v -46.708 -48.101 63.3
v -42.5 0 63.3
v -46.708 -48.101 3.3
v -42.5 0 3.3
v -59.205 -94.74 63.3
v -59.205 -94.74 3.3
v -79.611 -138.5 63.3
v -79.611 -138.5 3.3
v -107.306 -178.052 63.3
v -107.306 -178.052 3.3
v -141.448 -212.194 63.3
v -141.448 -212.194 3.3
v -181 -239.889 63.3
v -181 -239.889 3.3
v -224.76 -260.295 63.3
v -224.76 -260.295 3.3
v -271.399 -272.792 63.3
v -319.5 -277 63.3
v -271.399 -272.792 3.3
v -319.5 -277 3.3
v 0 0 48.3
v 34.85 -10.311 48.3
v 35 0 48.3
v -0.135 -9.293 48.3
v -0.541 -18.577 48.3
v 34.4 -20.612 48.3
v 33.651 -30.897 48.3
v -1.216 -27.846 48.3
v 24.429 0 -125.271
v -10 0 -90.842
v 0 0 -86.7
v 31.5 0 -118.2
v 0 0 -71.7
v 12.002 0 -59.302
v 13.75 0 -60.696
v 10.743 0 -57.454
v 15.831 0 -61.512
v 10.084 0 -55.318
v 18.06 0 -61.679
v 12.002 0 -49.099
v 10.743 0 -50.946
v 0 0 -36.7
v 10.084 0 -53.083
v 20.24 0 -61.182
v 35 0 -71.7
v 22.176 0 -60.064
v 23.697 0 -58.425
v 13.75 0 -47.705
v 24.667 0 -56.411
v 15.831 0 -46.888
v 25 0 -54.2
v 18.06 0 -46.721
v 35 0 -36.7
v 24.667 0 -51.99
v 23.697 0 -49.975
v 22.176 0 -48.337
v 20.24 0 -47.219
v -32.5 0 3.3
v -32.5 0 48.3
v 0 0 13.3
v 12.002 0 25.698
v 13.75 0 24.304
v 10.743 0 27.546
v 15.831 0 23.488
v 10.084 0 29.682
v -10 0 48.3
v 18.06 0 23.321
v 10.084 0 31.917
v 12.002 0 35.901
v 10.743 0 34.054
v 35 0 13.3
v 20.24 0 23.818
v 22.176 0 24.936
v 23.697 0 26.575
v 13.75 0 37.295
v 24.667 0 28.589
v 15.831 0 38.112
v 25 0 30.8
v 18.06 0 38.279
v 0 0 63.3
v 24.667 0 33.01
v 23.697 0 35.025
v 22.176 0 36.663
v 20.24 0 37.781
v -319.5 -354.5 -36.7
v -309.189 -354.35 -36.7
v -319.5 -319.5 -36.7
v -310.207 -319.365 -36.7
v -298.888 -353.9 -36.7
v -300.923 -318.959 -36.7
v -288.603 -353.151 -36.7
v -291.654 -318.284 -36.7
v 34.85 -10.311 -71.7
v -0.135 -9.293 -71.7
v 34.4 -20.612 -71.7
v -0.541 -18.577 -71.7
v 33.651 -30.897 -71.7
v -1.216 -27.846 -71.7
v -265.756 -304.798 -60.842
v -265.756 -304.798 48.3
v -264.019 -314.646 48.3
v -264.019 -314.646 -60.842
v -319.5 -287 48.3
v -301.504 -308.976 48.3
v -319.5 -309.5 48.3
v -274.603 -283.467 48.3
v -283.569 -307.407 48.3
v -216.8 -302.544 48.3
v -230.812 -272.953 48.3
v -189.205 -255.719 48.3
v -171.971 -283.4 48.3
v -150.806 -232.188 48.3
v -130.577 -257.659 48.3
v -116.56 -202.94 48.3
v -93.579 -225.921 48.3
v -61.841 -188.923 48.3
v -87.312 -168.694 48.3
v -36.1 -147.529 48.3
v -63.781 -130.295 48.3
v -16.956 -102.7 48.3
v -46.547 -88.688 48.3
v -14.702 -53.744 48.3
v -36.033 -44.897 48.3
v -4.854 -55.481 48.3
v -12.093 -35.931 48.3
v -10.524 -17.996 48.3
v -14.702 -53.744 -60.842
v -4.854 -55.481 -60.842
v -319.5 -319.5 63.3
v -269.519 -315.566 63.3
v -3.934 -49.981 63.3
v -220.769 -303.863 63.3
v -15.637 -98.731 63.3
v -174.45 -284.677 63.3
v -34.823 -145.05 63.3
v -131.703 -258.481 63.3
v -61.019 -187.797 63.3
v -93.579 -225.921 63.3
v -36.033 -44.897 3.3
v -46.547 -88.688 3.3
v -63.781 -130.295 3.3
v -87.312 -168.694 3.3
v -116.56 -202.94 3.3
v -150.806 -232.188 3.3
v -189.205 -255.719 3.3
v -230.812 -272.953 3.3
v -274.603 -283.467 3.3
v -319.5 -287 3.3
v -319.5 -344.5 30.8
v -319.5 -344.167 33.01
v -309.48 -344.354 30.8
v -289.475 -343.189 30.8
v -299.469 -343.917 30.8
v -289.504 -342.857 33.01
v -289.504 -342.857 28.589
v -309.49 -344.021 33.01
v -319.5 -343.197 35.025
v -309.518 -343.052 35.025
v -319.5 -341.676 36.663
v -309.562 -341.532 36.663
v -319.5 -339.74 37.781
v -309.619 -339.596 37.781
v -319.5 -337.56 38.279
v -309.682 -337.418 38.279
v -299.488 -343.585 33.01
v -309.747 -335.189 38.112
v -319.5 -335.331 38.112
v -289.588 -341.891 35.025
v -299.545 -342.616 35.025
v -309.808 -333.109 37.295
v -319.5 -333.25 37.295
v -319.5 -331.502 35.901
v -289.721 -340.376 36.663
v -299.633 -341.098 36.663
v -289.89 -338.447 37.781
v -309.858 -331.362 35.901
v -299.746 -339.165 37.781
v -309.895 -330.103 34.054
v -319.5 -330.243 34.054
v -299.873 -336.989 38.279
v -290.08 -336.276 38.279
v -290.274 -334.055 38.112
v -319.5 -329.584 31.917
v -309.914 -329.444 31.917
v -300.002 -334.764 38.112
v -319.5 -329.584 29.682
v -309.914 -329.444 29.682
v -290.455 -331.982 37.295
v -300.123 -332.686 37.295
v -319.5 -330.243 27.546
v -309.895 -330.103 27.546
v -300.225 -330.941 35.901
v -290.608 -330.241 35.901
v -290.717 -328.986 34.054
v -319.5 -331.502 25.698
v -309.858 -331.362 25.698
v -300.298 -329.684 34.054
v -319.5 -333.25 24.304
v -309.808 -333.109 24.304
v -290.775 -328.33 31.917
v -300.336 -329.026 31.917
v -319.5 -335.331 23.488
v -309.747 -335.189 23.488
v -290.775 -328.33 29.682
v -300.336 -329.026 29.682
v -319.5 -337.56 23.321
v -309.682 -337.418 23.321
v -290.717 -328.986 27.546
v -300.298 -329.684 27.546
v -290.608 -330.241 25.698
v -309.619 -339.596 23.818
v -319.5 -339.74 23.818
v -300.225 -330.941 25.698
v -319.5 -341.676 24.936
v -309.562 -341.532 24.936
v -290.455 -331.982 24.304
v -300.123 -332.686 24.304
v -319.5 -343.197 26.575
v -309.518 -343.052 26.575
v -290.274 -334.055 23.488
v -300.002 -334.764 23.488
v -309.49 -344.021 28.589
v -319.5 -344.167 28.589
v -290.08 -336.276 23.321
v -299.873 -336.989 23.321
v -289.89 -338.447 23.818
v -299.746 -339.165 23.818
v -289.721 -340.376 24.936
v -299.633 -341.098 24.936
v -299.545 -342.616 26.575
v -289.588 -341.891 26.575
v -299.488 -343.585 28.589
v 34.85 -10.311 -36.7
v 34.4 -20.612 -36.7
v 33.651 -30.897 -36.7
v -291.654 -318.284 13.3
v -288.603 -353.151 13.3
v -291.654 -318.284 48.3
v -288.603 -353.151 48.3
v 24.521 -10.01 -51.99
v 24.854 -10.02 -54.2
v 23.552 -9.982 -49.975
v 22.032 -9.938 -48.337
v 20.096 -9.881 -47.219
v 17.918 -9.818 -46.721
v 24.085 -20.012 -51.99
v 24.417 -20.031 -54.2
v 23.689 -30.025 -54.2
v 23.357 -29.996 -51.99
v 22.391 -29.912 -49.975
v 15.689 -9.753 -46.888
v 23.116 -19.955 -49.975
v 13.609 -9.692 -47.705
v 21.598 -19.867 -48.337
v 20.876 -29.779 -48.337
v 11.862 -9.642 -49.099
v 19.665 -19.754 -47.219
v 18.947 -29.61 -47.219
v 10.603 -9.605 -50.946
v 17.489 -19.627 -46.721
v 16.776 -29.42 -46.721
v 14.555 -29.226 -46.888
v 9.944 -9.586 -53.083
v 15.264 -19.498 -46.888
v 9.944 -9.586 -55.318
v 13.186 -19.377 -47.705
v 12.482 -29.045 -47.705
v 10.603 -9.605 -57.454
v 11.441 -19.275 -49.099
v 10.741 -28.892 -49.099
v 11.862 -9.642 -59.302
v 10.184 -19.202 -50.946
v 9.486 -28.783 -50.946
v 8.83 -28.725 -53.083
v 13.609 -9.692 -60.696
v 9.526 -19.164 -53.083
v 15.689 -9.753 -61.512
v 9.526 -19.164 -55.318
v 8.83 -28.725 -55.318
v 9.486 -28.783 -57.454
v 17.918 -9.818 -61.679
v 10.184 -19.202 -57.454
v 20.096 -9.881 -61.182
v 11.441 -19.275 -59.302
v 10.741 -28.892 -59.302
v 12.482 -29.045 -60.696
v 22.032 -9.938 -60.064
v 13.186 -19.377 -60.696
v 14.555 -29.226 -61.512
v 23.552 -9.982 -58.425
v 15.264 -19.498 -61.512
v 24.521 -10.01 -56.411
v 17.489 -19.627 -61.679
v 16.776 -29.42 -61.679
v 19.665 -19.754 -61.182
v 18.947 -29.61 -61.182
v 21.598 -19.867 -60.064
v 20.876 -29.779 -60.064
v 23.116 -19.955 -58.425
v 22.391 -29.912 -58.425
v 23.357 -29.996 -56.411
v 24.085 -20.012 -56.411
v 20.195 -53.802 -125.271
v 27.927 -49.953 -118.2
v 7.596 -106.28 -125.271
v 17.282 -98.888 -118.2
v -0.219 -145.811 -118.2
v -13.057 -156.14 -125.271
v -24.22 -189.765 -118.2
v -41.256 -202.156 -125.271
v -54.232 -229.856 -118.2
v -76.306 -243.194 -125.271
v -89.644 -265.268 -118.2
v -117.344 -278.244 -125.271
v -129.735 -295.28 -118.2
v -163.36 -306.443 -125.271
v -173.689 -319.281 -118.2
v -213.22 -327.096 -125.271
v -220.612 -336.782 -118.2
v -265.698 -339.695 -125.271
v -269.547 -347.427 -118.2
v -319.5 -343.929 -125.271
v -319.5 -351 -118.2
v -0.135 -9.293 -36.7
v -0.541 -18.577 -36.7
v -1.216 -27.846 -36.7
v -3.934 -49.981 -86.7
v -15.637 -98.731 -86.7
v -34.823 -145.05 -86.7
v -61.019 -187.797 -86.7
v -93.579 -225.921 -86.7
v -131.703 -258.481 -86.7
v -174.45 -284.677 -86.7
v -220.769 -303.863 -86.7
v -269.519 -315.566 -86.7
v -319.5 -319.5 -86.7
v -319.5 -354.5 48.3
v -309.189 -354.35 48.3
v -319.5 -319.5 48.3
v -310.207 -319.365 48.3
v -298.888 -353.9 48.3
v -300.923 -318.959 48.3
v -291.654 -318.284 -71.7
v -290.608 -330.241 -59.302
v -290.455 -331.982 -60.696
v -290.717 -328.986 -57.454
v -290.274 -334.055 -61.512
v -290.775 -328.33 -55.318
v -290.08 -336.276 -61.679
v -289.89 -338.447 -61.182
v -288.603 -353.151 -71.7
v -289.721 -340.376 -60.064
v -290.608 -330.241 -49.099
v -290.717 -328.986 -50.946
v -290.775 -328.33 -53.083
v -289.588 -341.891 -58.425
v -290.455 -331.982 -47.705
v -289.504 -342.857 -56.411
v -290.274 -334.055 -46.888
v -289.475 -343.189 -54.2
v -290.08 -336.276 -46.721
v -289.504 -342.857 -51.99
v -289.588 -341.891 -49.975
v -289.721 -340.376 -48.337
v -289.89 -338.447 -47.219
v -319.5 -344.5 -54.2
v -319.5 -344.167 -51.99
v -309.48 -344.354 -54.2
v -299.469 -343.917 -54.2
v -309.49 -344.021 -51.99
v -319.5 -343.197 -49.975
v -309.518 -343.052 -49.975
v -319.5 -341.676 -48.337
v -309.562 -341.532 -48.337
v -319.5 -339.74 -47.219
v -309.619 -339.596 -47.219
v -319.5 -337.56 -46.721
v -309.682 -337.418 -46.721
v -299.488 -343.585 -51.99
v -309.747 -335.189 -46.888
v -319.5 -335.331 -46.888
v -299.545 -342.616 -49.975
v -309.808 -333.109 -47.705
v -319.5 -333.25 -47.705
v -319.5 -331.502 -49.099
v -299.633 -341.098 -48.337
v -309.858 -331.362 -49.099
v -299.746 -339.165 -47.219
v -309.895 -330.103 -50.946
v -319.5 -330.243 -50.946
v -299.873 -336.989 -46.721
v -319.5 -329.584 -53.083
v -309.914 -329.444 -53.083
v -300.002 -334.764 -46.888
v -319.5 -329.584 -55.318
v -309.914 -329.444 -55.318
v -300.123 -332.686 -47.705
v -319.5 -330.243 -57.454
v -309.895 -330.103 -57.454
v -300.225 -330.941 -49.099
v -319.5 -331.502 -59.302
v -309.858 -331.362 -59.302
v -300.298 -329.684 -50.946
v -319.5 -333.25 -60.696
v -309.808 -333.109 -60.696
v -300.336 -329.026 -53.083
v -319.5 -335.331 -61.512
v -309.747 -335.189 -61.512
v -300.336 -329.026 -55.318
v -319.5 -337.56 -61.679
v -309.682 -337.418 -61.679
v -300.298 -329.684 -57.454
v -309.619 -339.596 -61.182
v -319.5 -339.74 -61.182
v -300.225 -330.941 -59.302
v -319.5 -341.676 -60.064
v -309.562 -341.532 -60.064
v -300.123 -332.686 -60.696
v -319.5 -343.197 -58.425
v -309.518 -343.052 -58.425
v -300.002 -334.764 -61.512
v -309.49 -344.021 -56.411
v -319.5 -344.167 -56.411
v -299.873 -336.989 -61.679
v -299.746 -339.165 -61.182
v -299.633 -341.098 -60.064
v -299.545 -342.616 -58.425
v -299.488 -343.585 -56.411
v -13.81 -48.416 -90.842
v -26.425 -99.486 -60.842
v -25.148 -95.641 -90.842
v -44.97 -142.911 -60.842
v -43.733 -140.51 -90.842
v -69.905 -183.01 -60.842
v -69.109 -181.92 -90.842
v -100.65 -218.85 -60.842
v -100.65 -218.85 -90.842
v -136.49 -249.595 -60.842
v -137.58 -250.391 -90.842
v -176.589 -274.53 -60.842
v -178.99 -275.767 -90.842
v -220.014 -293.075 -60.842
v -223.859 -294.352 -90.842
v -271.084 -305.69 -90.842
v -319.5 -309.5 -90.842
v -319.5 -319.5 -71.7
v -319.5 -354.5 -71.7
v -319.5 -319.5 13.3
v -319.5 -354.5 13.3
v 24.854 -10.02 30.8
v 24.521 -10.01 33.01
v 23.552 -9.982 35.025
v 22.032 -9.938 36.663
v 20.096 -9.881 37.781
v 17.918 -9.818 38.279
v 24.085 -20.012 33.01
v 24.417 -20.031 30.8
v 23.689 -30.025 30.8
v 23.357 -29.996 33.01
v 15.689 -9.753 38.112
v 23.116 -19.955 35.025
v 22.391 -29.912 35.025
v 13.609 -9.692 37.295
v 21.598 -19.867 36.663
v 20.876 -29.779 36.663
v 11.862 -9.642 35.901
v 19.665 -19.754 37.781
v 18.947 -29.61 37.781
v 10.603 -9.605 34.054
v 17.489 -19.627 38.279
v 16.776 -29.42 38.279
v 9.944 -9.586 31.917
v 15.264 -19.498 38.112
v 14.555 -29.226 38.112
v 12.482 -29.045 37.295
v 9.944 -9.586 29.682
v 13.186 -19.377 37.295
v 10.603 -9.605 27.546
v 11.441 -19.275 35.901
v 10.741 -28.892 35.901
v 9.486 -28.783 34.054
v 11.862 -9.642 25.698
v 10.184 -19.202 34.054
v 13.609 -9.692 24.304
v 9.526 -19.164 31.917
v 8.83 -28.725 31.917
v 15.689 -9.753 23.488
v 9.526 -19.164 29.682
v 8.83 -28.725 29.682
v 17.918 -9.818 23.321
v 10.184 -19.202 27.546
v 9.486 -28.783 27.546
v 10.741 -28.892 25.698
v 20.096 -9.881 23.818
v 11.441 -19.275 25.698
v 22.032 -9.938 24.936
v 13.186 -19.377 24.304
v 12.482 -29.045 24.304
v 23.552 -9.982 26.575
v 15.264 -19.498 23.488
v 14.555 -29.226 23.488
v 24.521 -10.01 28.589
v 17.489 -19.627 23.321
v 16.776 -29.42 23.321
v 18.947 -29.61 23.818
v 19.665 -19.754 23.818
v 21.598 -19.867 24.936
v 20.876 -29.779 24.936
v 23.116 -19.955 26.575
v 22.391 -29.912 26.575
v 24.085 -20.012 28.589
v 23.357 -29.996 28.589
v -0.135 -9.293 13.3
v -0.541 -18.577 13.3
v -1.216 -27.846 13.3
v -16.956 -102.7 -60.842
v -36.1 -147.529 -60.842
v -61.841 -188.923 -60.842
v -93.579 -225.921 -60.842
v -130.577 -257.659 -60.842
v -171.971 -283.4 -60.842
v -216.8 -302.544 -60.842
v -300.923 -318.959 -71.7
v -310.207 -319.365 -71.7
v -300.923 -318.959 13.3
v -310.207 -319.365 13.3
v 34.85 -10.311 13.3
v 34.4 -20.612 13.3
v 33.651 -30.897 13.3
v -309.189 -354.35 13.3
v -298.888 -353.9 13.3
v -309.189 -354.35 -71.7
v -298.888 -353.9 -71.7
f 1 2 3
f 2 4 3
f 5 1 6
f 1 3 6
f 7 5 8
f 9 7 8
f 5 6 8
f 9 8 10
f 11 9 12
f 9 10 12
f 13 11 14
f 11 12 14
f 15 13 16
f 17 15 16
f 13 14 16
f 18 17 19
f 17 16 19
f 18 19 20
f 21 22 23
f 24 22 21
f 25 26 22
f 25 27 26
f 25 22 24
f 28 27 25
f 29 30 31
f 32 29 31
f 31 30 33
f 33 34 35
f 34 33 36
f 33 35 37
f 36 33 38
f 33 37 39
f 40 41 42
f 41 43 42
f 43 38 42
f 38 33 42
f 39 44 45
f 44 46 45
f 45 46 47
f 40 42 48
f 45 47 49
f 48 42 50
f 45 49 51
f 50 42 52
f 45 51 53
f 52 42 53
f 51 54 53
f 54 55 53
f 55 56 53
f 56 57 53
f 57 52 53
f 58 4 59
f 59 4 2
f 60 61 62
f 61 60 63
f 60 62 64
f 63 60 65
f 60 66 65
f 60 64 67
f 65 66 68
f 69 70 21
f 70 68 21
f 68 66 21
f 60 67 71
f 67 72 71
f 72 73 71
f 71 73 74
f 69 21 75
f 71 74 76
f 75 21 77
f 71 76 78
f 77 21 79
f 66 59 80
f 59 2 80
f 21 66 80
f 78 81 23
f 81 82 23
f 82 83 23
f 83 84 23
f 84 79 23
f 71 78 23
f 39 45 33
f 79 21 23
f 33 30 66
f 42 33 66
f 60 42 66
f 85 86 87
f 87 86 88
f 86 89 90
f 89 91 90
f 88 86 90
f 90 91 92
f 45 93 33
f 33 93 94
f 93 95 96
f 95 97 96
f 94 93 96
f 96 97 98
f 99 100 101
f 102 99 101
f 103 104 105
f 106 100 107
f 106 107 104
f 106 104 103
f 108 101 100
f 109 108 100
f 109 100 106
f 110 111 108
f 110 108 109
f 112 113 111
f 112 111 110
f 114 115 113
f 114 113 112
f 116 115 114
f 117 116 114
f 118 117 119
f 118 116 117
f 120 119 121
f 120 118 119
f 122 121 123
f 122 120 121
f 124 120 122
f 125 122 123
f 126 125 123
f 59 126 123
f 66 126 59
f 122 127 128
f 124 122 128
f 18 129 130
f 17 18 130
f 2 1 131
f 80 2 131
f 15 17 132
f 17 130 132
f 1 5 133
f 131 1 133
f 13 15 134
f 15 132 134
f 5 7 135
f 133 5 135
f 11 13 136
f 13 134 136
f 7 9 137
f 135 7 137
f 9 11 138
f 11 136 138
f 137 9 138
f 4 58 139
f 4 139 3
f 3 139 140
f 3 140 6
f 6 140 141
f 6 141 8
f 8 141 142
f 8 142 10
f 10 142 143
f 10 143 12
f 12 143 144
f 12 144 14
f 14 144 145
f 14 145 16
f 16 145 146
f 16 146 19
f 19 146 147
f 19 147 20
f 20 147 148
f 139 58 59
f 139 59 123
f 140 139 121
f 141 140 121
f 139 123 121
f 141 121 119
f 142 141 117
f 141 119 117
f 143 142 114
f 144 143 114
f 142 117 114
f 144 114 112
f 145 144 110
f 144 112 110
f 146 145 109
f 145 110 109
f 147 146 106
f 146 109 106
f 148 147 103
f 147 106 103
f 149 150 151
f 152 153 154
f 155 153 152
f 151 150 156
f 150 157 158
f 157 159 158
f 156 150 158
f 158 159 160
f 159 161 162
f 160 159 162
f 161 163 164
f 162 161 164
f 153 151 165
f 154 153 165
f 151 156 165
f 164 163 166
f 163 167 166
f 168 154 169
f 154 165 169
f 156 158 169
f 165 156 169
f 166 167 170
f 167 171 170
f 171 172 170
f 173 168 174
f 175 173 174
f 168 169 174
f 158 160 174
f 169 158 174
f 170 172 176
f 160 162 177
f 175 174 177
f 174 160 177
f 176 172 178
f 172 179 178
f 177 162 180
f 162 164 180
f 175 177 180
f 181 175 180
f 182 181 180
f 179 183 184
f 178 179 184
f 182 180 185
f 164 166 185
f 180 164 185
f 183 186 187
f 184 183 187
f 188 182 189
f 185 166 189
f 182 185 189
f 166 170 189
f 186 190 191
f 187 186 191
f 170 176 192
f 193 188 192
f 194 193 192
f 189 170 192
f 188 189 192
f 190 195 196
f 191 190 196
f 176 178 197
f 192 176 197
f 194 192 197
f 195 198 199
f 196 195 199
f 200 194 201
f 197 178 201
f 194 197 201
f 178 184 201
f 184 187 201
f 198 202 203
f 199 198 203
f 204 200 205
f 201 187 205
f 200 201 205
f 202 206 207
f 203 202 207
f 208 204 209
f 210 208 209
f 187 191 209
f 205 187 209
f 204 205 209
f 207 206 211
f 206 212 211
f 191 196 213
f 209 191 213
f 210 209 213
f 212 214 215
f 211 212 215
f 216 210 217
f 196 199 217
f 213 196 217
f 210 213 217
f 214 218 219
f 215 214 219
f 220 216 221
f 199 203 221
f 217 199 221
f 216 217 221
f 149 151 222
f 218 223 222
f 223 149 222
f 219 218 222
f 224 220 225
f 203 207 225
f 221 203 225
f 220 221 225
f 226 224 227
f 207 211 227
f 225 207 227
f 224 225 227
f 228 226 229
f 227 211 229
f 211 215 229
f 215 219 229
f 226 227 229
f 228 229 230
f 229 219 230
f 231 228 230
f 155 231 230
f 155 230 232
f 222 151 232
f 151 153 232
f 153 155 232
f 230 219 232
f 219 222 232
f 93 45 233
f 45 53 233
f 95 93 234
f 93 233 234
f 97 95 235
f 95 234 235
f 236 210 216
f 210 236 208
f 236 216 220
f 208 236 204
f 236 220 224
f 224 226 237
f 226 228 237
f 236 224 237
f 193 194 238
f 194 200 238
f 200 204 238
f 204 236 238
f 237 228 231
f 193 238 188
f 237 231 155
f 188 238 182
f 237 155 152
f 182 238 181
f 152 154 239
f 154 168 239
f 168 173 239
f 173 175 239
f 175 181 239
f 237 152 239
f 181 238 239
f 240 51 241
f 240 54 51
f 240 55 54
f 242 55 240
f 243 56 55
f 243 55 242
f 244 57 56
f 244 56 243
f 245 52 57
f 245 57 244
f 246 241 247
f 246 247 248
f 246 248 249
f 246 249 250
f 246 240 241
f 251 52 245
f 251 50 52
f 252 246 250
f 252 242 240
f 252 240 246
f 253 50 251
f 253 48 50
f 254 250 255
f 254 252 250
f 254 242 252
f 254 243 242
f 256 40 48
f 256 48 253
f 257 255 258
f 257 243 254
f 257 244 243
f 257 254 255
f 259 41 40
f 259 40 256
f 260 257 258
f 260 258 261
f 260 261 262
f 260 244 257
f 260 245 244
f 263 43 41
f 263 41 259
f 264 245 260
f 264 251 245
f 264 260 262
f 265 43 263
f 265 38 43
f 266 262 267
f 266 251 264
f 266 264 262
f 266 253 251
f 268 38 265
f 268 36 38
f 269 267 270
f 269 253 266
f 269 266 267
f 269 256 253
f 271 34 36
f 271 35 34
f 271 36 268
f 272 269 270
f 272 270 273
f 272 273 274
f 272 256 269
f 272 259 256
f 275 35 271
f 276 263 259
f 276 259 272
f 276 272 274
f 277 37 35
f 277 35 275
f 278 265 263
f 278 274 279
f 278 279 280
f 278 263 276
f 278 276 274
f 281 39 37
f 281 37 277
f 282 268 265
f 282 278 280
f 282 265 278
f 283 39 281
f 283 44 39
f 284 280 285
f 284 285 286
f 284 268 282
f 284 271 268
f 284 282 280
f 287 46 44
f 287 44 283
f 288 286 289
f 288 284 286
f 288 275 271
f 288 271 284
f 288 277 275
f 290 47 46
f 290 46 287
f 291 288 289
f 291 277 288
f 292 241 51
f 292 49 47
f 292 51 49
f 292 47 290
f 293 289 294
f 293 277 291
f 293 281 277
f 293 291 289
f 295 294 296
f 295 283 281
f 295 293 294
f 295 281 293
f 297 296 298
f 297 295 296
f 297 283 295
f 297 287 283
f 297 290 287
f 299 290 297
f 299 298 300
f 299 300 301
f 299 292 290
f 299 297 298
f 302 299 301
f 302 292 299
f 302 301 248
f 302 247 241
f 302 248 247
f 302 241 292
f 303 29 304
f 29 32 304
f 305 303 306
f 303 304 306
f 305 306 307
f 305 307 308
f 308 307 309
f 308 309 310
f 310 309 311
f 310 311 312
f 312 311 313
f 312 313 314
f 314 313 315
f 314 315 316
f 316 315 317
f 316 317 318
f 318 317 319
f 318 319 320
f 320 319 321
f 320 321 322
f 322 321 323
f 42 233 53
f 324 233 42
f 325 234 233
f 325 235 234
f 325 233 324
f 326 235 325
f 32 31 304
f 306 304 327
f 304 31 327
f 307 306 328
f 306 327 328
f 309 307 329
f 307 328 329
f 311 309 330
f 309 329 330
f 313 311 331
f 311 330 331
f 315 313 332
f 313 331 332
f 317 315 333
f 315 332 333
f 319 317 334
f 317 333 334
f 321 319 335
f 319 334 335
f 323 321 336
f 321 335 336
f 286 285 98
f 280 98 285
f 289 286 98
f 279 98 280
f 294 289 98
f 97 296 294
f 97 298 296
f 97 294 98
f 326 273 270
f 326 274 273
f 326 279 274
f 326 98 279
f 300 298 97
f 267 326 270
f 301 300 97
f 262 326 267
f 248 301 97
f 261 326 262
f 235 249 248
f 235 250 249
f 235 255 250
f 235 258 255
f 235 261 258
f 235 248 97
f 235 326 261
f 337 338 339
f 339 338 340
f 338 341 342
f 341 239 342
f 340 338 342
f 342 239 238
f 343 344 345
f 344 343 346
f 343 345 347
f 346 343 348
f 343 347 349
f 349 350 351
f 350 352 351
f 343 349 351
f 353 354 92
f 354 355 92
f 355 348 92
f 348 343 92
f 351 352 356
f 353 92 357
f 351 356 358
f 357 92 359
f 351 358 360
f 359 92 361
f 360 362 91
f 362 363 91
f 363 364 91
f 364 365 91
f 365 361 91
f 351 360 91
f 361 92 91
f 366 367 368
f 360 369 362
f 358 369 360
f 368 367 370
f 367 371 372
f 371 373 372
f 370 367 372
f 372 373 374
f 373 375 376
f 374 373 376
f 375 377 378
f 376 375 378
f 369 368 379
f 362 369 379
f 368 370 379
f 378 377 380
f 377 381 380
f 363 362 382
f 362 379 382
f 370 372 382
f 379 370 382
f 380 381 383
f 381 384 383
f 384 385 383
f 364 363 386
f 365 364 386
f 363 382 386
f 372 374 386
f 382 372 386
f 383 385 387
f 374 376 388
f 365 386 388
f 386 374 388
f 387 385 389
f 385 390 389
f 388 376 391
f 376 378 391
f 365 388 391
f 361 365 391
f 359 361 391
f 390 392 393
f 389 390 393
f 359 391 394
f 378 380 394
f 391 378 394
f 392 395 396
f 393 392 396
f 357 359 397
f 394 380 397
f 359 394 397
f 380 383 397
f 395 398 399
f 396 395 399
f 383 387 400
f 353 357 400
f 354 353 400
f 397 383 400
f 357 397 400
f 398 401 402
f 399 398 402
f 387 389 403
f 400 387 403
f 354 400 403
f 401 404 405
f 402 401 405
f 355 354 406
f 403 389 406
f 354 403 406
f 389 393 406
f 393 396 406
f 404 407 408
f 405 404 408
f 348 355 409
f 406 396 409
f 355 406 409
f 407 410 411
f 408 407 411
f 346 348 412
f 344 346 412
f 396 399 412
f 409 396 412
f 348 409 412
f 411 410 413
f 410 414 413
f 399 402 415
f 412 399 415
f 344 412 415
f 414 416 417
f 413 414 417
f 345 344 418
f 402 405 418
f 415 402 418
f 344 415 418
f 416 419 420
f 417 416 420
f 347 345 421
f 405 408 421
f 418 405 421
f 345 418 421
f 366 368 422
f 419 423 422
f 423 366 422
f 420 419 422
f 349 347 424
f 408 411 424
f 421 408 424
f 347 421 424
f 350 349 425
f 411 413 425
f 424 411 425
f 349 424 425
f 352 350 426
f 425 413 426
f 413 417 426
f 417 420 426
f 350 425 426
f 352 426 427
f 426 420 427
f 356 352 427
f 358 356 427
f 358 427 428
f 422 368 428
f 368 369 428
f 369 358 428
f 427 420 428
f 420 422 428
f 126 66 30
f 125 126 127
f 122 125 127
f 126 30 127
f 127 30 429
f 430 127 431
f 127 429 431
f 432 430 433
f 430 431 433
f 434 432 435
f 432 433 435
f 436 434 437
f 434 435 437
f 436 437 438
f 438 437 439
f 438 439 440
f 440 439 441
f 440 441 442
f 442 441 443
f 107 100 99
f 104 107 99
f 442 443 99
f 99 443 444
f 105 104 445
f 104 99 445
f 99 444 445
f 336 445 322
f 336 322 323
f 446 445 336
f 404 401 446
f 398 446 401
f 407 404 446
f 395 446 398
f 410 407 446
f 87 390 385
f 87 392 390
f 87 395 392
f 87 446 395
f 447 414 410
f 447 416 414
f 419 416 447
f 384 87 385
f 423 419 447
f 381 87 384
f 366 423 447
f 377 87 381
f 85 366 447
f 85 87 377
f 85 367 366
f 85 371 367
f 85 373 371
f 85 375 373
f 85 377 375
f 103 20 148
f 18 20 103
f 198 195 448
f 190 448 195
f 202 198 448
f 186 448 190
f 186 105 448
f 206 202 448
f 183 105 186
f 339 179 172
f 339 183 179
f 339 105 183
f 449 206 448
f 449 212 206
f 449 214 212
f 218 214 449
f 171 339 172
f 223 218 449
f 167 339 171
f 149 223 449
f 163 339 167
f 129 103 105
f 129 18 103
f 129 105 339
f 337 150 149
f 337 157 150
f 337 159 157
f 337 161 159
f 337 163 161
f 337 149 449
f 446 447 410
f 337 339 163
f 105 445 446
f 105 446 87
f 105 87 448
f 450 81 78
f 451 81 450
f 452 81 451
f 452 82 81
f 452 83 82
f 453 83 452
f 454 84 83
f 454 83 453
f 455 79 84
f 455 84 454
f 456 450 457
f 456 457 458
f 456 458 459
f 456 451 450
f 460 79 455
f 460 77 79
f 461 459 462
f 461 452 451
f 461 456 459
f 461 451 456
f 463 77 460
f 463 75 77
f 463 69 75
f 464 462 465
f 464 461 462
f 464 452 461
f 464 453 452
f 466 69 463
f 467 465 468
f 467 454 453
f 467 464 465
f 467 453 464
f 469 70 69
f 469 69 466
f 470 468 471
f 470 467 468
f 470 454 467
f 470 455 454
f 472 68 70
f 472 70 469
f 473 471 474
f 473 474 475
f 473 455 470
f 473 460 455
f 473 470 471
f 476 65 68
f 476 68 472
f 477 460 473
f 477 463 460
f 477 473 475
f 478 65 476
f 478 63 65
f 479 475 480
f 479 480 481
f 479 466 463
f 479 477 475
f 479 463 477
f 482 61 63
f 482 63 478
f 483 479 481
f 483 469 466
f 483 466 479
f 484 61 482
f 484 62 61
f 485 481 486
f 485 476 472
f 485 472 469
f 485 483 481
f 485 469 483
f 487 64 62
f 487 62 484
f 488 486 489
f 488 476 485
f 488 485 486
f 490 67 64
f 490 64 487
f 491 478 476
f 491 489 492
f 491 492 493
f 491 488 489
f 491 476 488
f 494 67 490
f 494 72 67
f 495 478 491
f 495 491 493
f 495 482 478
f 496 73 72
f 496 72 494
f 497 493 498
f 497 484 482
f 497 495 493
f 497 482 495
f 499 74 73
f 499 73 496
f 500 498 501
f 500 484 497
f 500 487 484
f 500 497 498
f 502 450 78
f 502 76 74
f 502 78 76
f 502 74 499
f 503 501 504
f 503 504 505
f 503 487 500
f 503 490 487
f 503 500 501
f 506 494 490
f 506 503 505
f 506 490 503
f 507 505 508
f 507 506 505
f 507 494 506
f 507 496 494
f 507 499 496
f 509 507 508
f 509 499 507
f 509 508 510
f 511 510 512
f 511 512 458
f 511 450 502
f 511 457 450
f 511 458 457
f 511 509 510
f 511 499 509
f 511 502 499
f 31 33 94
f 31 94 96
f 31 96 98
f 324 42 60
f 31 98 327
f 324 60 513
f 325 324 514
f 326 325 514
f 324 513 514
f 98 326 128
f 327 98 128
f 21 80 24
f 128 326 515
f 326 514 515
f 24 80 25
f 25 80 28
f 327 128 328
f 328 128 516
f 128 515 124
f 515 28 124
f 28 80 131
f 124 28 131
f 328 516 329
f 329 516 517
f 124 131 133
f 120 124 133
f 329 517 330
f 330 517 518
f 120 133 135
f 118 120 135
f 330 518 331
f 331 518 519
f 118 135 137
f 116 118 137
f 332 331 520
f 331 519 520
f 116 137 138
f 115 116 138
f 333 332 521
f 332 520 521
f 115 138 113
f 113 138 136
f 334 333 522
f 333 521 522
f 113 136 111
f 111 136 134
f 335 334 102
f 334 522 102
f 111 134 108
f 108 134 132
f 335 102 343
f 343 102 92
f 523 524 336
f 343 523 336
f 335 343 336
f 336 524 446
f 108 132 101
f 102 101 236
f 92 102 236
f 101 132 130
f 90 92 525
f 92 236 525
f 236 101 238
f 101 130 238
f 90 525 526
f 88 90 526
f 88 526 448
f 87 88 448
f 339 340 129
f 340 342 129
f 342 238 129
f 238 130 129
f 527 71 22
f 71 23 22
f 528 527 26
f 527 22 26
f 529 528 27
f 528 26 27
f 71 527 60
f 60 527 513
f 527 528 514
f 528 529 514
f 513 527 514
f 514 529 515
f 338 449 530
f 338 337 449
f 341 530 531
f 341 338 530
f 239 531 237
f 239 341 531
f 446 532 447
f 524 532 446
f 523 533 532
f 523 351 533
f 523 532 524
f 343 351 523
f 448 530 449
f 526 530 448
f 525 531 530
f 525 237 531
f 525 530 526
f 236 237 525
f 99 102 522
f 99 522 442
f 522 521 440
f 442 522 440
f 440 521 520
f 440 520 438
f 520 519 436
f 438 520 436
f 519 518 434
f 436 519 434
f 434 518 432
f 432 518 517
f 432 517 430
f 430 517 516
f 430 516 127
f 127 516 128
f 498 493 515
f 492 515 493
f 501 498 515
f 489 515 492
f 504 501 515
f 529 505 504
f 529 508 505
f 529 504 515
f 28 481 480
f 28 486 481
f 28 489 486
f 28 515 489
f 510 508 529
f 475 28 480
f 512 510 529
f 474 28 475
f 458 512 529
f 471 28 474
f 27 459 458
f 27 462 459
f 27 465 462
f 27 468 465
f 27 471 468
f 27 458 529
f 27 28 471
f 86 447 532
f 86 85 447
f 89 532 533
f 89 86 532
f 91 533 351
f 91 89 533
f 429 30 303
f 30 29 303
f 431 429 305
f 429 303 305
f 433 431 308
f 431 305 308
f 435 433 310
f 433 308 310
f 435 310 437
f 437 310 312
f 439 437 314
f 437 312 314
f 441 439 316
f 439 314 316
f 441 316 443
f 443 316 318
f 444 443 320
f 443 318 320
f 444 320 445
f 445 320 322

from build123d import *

# Parameters (mm, degrees)
F1_ANGLE       = 90
F2_W           = 35
F2_H           = 35
F2_R           = 7.5
F3_ANGLE       = 5
F4_ANGLE_START = 270
F4_ANGLE       = 5
F5_W           = 10
F5_H           = 109.1421356237
F6_ANGLE_START = 280
F6_ANGLE       = 70


with BuildPart() as f1:
    # F0 (on Front) → F1 (revolve)
    with BuildSketch(Plane.XZ):
        Polygon((0, -86.7003262881), (0, 63.2996737119), (-42.5, 63.2996737119), (-42.5, 3.2996737119), (-32.5, 3.2996737119), (-32.5, 48.2996737119), (-10, 48.2996737119), (-10, -90.8424619118), (24.4289321881, -125.2713940999), (31.5, -118.2003262881), align=None)
    revolve(axis=Axis((-319.5, 0, -5.3764432669), (0, 0, -1)), revolution_arc=F1_ANGLE)

    # F2 (on face) → F3 (revolve)
    with BuildSketch(Plane(origin=(-319.5, 0, 0), x_dir=(0, -1, 0), z_dir=(-1, 0, 0))):
        with Locations((337, 30.7996737119)):
            Rectangle(F2_W, F2_H)
        with Locations((337, 30.7996737119)):
            Circle(F2_R, mode=Mode.SUBTRACT)
        with Locations((337, -54.2003262881)):
            Rectangle(F2_W, F2_H)
        with Locations((337, -54.2003262881)):
            Circle(F2_R, mode=Mode.SUBTRACT)
    revolve(axis=Axis((-319.5, 0, 7.2890669107), (0, 0, 1)), revolution_arc=F3_ANGLE)

    # F2 (on face) → F4 (revolve)
    with BuildSketch(Plane(origin=(-319.5, 0, 0), x_dir=(0, -1, 0), z_dir=(-1, 0, 0)), mode=Mode.PRIVATE) as f4_sk:
        with Locations((337, 30.7996737119)):
            Rectangle(F2_W, F2_H)
        with Locations((337, 30.7996737119)):
            Circle(F2_R, mode=Mode.SUBTRACT)
        with Locations((337, -54.2003262881)):
            Rectangle(F2_W, F2_H)
        with Locations((337, -54.2003262881)):
            Circle(F2_R, mode=Mode.SUBTRACT)
    revolve(f4_sk.sketch.rotate(Axis((-319.5, 0, 63.2996737119), (0, 0, -1)), F4_ANGLE_START), axis=Axis((-319.5, 0, 63.2996737119), (0, 0, -1)), revolution_arc=F4_ANGLE)

    # F5 (on Front) → F6 (revolve, cut)
    with BuildSketch(Plane.XZ, mode=Mode.PRIVATE) as f6_sk:
        with Locations((-5, -6.2713940999)):
            Rectangle(F5_W, F5_H)
    revolve(f6_sk.sketch.rotate(Axis((-319.5, 0, -29.9057289958), (0, 0, 1)), F6_ANGLE_START), axis=Axis((-319.5, 0, -29.9057289958), (0, 0, 1)), revolution_arc=F6_ANGLE, mode=Mode.SUBTRACT)


solid = f1.part
